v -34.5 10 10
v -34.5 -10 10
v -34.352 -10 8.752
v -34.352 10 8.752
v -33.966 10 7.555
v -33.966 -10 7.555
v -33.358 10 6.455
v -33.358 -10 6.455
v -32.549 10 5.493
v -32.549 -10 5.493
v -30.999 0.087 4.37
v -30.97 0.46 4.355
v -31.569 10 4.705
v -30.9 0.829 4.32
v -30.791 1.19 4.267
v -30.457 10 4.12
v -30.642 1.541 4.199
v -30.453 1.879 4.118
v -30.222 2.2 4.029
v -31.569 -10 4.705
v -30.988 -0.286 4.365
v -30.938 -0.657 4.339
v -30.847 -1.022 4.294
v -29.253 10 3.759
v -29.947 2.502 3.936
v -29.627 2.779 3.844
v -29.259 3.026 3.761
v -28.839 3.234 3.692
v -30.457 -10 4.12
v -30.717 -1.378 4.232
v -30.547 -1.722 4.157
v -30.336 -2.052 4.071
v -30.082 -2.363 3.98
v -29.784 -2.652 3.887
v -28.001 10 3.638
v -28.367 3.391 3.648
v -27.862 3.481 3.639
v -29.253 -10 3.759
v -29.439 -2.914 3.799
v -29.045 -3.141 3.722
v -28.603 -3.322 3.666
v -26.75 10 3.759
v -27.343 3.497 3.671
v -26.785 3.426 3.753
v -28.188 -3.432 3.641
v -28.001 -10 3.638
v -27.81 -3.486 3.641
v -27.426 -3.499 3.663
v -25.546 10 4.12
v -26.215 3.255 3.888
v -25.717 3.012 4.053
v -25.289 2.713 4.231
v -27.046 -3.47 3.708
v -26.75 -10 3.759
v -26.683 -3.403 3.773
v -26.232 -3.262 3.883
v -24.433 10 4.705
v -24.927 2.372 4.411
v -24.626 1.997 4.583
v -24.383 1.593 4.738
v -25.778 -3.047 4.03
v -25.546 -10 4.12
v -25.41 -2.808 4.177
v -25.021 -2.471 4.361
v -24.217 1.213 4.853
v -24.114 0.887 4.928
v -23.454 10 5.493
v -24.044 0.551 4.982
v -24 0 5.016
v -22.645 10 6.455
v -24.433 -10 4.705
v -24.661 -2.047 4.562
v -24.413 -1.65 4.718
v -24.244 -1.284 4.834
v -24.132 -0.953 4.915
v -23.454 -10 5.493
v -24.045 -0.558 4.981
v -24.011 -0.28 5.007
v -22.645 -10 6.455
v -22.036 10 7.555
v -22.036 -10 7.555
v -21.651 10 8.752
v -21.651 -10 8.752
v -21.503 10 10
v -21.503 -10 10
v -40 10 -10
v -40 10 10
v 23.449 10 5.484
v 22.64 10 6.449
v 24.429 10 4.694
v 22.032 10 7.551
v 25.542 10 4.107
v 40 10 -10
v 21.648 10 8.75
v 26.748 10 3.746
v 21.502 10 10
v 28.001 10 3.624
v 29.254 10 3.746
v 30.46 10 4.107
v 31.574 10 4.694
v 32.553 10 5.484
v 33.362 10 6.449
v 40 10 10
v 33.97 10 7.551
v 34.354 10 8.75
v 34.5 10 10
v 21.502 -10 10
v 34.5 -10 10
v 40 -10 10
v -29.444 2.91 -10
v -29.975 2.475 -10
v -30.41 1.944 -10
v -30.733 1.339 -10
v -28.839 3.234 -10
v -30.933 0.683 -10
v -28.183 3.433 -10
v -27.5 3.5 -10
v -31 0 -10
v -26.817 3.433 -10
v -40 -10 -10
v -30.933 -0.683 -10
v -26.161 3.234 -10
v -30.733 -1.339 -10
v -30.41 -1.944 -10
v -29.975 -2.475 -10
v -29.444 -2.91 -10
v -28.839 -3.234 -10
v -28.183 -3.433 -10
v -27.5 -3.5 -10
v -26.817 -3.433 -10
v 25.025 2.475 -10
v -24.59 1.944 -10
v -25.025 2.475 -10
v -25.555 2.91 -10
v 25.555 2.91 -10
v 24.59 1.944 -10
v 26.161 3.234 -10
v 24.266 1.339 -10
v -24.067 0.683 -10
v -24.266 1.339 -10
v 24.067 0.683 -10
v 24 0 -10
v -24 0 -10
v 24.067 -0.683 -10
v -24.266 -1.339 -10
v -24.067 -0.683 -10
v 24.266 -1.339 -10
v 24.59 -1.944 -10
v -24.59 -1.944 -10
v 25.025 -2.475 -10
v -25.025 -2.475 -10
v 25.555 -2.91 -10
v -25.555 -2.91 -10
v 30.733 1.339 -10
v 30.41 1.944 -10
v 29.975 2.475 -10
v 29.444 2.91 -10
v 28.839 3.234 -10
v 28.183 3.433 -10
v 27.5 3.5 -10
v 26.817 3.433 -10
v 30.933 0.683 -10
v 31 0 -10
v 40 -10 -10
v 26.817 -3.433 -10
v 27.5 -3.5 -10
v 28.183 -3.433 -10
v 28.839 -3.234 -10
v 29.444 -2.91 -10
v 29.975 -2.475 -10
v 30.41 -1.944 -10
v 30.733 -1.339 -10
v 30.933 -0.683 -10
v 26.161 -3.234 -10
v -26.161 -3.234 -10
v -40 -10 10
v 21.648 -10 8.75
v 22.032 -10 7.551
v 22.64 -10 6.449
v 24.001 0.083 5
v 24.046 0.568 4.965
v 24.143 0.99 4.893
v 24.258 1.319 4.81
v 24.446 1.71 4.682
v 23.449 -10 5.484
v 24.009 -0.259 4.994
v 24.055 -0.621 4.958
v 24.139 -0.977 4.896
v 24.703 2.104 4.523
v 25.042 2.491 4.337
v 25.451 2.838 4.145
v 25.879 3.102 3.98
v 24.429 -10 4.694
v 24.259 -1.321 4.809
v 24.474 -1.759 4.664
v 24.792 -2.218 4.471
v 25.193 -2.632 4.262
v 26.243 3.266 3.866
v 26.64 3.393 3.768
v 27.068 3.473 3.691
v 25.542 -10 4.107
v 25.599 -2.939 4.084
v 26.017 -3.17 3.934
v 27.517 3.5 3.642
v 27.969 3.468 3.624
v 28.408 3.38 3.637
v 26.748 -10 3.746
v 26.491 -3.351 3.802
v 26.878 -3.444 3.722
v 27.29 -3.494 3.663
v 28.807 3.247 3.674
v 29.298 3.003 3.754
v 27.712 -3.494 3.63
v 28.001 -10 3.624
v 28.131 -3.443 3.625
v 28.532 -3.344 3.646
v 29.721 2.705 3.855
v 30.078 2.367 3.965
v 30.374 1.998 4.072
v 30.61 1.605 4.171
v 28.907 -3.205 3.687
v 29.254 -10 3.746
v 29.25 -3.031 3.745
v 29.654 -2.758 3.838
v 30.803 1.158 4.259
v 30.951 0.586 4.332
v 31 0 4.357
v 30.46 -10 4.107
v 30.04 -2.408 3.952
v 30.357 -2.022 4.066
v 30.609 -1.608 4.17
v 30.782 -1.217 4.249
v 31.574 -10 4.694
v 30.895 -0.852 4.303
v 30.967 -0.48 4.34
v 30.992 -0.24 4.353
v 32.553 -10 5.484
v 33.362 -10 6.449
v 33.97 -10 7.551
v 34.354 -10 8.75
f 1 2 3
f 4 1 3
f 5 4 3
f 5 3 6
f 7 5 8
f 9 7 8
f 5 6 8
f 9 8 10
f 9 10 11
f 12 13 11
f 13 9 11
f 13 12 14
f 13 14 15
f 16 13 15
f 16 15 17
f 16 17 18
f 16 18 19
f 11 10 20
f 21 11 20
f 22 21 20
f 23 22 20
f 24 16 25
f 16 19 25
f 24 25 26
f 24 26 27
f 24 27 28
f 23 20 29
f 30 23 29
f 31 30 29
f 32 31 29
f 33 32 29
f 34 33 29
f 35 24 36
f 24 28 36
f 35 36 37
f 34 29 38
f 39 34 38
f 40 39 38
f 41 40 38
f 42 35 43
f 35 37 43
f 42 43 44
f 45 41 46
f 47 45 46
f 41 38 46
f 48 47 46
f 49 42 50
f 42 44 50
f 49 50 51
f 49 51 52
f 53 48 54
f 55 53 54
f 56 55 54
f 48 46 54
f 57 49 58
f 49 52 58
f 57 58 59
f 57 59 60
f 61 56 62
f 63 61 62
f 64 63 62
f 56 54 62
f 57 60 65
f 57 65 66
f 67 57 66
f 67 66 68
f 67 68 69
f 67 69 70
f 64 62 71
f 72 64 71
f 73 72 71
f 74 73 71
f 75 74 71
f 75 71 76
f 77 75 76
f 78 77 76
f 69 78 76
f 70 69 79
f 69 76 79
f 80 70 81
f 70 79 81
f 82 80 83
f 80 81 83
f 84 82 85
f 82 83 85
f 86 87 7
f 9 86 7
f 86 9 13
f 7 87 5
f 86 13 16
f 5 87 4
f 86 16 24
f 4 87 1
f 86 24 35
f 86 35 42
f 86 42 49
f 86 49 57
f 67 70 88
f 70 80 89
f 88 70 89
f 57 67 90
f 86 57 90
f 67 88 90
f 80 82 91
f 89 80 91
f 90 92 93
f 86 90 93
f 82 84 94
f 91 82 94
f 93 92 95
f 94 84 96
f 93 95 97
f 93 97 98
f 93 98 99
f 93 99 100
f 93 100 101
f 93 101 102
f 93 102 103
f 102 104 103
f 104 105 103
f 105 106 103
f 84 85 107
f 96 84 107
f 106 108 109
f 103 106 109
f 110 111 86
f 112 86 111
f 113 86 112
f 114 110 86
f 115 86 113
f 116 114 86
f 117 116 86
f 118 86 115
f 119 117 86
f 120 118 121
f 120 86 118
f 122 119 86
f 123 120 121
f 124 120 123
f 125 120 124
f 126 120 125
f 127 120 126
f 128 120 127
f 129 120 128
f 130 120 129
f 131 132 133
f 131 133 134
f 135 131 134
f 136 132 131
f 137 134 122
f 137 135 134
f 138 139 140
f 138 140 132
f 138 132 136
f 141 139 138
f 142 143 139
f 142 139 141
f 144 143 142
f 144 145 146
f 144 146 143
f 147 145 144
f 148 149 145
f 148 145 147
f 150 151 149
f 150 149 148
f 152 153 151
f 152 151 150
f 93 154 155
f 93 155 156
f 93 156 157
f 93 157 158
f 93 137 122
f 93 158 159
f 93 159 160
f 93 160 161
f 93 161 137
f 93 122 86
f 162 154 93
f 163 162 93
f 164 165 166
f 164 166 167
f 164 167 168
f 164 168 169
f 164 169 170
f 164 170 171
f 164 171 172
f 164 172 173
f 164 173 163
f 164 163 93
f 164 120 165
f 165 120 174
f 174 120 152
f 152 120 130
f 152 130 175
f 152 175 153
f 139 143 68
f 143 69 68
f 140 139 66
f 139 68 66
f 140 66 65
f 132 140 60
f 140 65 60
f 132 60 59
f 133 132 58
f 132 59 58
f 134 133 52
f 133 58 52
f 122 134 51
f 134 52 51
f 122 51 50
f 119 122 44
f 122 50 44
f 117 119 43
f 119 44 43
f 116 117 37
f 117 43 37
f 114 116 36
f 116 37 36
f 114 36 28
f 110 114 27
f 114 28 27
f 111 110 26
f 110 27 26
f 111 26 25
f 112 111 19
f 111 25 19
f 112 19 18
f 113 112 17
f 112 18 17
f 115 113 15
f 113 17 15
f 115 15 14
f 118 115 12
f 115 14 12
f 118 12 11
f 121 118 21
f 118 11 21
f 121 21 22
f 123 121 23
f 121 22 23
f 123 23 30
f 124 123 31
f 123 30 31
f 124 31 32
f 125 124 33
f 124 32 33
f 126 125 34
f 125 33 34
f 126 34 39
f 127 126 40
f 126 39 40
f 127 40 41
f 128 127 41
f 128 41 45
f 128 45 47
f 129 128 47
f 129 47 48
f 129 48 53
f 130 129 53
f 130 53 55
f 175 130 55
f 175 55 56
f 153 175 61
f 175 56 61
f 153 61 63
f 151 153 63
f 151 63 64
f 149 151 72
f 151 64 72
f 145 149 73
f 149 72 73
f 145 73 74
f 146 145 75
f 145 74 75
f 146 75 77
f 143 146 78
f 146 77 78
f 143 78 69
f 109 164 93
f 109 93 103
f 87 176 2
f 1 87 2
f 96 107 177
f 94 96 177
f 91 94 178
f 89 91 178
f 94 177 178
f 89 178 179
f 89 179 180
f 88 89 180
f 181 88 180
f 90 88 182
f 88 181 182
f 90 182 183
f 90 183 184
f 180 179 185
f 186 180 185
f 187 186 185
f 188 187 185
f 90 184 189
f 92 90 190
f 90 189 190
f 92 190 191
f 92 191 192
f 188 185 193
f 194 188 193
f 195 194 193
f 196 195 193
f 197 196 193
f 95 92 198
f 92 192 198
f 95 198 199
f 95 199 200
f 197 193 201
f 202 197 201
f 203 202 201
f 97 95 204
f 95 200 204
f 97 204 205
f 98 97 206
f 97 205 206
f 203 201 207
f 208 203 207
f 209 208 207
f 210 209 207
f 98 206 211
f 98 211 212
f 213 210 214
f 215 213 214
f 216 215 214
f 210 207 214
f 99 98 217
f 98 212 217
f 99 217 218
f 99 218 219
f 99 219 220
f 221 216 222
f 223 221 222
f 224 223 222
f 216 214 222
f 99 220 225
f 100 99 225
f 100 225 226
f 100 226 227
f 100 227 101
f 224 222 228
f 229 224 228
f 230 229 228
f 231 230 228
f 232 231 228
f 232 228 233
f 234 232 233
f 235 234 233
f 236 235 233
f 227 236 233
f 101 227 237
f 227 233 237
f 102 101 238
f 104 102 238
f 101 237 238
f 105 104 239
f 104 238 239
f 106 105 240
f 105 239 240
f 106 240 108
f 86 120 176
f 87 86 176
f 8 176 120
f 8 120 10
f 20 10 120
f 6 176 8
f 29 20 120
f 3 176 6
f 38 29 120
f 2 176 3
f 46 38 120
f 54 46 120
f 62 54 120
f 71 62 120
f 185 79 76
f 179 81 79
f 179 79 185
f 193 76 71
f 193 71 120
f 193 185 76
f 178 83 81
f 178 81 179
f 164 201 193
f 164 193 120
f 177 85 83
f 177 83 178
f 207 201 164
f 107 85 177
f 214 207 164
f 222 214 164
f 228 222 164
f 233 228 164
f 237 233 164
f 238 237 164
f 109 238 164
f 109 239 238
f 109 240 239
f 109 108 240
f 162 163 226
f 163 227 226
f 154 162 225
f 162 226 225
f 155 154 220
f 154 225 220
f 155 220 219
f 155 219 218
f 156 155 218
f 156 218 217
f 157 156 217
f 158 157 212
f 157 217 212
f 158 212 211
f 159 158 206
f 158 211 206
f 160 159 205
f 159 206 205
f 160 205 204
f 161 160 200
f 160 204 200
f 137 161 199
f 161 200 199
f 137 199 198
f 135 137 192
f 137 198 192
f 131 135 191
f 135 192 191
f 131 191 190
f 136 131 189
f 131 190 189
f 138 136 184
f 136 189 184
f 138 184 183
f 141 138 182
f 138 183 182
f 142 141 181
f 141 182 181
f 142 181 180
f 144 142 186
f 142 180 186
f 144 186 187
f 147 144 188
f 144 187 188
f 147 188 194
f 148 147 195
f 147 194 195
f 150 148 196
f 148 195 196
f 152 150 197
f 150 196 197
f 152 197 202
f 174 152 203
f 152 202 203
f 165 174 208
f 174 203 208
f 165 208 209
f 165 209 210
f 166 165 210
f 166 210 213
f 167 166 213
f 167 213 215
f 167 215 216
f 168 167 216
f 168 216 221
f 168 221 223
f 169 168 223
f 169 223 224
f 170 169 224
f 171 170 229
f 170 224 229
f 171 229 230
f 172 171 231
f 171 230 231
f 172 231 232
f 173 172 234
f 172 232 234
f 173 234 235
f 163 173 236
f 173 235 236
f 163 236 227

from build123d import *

# Parameters (mm, degrees)
F0_W     = 80
F0_H     = 20
F2_DEPTH = 10
F1_R     = 6.5
F3_DEPTH = 10
F4_R     = 3.5
F5_DEPTH = 20


with BuildPart() as f2:
    # F0 (on Front) → F2 (new body, symmetric)
    with BuildSketch(Plane.XZ):
        Rectangle(F0_W, F0_H)
    extrude(amount=F2_DEPTH, both=True)

    # F1 (on Front) → F3 (cut, symmetric)
    with BuildSketch(Plane.XZ):
        with Locations((-28.001357, 10.137838)):
            Circle(F1_R)
        with Locations((28.001095, 10.123801)):
            Circle(F1_R)
    extrude(amount=F3_DEPTH, both=True, mode=Mode.SUBTRACT)

    # F4 (on Top) → F5 (cut, symmetric)
    with BuildSketch(Plane.XY):
        with Locations((-27.499896, 0)):
            Circle(F4_R)
        with Locations((27.499916, 0)):
            Circle(F4_R)
    extrude(amount=F5_DEPTH, both=True, mode=Mode.SUBTRACT)


solid = f2.part
